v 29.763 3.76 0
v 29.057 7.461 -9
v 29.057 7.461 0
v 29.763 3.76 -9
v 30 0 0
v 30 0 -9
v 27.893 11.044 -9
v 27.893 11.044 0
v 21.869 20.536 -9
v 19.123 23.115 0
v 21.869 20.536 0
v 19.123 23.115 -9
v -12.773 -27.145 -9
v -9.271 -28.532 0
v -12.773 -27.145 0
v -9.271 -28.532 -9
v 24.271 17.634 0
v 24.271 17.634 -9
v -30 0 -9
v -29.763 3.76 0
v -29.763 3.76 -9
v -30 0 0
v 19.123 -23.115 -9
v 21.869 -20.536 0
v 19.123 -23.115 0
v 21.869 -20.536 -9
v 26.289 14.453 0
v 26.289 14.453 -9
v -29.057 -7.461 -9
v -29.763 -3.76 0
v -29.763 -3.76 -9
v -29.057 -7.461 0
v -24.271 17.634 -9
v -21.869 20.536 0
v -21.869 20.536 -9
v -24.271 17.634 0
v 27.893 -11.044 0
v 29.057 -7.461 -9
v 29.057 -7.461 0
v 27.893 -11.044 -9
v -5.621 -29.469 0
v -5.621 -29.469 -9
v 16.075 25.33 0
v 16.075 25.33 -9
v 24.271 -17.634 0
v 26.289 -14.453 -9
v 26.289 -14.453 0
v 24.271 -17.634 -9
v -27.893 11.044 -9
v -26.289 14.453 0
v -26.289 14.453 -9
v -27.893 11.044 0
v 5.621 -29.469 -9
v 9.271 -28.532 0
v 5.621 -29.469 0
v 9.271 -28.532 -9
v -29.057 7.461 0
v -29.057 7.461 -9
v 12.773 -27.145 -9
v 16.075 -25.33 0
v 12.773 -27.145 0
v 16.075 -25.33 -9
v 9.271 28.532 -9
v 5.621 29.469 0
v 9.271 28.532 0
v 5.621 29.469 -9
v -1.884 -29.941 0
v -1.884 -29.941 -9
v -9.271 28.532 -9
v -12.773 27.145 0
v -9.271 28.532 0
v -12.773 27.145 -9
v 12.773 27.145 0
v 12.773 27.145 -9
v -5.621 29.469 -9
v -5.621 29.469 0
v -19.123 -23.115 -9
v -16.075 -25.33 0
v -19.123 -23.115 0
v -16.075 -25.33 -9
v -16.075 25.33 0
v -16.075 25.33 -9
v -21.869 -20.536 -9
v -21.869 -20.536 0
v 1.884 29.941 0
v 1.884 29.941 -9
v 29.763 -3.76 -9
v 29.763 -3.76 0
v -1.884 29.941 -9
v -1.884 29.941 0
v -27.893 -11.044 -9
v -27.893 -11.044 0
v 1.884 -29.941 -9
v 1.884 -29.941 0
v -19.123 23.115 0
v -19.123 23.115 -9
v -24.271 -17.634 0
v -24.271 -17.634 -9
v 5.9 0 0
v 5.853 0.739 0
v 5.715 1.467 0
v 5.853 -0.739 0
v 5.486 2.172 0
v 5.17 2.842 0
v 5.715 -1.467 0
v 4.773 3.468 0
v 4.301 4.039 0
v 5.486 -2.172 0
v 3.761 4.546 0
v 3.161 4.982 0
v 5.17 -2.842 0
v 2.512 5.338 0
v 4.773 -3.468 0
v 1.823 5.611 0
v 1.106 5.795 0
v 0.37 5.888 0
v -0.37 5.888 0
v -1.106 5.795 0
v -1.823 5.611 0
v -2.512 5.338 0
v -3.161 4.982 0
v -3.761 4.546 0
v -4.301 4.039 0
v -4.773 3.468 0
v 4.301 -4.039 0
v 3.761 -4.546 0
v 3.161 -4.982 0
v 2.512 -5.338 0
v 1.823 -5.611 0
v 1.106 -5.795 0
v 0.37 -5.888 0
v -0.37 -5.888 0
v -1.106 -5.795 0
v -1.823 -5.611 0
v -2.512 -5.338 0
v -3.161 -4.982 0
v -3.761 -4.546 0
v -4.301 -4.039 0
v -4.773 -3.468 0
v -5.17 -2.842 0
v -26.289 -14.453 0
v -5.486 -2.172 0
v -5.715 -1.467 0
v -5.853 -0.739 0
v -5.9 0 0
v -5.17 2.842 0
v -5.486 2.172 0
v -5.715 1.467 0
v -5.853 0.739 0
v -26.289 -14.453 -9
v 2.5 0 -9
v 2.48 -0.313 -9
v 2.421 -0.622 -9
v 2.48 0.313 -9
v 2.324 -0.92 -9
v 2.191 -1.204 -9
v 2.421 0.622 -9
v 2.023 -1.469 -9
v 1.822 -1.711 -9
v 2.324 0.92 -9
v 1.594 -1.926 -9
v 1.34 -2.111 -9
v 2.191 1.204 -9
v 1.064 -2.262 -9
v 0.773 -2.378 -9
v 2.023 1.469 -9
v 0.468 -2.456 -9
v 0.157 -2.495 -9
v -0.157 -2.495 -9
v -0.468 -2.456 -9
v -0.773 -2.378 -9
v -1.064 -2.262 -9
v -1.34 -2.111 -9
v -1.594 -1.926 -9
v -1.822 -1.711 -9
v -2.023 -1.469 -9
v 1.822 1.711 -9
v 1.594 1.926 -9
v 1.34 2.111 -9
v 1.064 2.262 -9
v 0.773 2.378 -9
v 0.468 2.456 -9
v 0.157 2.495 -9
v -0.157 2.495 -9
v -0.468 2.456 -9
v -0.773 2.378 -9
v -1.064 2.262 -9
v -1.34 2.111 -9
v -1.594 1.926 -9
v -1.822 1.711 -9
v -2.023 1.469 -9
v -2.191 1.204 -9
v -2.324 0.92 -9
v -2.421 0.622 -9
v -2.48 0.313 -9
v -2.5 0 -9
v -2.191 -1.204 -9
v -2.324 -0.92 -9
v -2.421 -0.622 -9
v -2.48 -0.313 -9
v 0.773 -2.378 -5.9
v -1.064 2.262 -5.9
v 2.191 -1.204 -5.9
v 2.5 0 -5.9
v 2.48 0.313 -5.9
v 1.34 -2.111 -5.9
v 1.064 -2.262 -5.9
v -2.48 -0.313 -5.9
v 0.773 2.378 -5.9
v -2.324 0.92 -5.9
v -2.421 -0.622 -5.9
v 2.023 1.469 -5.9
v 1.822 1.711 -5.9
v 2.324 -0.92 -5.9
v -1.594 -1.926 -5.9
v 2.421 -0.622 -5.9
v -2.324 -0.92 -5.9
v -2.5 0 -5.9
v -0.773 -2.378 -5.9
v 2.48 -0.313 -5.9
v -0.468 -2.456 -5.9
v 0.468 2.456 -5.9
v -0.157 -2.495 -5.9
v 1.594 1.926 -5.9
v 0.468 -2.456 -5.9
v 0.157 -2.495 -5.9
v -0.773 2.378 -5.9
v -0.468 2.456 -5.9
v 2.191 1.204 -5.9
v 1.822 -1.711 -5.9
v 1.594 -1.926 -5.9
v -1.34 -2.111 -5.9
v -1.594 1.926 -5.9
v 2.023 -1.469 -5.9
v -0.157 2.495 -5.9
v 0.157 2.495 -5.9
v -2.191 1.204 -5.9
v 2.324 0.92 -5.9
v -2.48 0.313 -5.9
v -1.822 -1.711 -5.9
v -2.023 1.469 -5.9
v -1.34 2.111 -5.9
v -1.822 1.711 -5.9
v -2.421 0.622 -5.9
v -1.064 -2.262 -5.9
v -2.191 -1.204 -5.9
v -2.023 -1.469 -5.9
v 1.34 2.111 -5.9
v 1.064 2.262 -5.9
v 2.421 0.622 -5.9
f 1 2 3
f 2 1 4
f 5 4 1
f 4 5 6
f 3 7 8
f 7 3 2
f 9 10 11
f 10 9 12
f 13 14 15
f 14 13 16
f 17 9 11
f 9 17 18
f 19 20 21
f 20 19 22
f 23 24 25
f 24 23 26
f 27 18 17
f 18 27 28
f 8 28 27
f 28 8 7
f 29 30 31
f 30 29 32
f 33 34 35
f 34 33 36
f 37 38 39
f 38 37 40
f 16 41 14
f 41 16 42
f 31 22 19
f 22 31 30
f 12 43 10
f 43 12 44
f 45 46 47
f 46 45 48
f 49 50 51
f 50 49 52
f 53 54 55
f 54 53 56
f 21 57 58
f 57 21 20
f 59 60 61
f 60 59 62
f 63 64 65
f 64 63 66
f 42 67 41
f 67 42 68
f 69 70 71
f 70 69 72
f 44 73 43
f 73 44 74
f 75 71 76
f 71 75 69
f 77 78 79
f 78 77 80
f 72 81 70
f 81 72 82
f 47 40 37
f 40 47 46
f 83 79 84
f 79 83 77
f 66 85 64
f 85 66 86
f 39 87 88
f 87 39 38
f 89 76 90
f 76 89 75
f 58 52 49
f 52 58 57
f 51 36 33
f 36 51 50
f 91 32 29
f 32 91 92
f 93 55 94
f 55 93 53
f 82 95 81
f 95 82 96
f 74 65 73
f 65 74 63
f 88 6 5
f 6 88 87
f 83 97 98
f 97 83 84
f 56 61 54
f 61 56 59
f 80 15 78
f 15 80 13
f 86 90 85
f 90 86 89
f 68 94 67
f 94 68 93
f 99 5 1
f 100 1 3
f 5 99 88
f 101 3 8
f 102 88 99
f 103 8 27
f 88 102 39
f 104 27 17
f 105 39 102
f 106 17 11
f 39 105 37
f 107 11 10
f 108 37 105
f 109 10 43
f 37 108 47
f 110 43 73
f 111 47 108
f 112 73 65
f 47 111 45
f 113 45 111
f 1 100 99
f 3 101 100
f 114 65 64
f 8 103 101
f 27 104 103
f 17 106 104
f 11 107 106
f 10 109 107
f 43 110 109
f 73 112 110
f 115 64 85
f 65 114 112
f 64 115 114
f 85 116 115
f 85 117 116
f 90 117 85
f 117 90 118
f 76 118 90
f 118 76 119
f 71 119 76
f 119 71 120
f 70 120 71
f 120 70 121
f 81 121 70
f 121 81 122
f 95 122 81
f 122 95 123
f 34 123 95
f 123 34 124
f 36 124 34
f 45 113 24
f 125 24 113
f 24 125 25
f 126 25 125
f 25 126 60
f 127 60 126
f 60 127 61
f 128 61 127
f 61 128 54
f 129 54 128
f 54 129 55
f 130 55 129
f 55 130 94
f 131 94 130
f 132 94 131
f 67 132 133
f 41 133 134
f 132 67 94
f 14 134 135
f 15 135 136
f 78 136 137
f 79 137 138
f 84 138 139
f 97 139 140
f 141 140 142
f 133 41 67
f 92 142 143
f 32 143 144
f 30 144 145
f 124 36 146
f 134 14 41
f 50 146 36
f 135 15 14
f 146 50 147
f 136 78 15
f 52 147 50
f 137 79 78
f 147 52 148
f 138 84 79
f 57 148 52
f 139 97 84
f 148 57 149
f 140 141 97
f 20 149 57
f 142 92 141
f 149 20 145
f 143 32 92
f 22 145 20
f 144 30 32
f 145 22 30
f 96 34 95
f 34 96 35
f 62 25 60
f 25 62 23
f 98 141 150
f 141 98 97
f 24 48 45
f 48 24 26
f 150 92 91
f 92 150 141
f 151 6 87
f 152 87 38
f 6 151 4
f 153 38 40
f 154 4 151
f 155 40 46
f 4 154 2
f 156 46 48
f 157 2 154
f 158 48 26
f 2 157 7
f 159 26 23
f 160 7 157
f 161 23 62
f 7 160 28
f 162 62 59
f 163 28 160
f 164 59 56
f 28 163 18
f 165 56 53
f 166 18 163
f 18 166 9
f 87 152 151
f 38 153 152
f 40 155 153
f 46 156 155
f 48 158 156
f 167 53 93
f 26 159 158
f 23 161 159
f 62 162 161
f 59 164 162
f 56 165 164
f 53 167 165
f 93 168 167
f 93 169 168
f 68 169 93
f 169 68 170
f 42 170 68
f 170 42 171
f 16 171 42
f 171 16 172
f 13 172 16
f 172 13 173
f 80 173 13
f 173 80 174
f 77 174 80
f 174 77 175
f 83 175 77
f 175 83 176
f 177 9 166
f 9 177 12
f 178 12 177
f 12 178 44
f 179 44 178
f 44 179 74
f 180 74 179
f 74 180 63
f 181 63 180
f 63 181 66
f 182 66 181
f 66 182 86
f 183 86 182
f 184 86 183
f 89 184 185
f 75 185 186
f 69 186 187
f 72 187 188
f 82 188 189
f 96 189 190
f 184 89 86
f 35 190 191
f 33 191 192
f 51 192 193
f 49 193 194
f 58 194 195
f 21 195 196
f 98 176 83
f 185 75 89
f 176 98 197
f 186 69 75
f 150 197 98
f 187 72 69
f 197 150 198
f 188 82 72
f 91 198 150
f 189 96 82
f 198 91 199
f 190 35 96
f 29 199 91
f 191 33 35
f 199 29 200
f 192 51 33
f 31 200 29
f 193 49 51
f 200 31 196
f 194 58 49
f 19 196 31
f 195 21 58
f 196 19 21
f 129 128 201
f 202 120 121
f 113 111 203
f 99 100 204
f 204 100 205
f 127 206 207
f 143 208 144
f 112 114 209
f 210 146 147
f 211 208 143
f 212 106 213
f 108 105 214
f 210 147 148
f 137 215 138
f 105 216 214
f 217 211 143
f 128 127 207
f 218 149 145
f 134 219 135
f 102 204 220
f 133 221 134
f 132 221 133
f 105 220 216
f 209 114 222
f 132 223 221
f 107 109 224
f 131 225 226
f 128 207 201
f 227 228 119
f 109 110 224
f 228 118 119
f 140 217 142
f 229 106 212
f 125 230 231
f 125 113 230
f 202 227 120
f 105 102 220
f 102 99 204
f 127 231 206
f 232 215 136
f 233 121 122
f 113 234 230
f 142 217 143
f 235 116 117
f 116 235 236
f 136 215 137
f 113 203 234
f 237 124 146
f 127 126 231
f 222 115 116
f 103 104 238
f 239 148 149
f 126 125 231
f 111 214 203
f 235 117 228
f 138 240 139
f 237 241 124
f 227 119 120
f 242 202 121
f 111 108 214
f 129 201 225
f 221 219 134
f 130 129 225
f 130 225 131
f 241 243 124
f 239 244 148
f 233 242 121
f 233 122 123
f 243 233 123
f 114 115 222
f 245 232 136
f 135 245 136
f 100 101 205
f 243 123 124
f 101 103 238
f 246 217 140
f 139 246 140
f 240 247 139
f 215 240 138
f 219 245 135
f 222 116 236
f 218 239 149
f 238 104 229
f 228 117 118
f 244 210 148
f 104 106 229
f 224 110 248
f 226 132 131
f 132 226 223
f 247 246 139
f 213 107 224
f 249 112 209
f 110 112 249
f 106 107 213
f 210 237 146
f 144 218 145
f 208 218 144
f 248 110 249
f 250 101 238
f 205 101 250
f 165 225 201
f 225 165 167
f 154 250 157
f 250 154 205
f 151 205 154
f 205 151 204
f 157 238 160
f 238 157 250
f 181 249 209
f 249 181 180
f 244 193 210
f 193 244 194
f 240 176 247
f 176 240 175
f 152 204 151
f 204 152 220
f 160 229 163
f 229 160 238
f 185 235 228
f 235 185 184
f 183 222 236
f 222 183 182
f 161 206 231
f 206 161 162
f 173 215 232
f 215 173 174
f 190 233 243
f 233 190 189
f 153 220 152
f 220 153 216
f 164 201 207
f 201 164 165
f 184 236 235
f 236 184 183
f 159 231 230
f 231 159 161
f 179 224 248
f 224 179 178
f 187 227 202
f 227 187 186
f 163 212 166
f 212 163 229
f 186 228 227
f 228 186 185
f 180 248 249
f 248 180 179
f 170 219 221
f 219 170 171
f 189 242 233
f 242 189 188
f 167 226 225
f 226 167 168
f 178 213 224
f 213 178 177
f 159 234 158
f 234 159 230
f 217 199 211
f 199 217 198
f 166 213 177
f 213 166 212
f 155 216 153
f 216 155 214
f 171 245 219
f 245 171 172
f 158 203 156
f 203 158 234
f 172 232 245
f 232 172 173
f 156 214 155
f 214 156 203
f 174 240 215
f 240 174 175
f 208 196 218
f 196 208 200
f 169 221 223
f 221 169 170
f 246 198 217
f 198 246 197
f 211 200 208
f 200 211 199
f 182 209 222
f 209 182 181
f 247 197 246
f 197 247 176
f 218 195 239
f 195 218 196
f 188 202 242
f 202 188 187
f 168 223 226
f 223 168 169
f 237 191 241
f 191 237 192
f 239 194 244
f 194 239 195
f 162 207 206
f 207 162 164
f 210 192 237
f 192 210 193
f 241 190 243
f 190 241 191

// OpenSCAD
$fn = 50;


difference() {
	union() {
		translate(v = [0, 0, -9.0000000000]) {
			cylinder(h = 9, r = 30.0000000000);
		}
		translate(v = [0, 0, -9.0000000000]) {
			cylinder(h = 9, r = 2.8750000000);
		}
	}
	union() {
		translate(v = [0, 0, 0]) {
			rotate(a = [0, 0, 0]) {
				difference() {
					union() {
						#translate(v = [0, 0, -9.0000000000]) {
							cylinder(h = 9, r = 2.2500000000);
						}
						#translate(v = [0, 0, -5.9000000000]) {
							cylinder(h = 5.9000000000, r1 = 2.5000000000, r2 = 5.9000000000);
						}
						#translate(v = [0, 0, -9.0000000000]) {
							cylinder(h = 9, r = 2.5000000000);
						}
						#translate(v = [0, 0, -9.0000000000]) {
							cylinder(h = 9, r = 2.2500000000);
						}
					}
					union();
				}
			}
		}
	}
}
